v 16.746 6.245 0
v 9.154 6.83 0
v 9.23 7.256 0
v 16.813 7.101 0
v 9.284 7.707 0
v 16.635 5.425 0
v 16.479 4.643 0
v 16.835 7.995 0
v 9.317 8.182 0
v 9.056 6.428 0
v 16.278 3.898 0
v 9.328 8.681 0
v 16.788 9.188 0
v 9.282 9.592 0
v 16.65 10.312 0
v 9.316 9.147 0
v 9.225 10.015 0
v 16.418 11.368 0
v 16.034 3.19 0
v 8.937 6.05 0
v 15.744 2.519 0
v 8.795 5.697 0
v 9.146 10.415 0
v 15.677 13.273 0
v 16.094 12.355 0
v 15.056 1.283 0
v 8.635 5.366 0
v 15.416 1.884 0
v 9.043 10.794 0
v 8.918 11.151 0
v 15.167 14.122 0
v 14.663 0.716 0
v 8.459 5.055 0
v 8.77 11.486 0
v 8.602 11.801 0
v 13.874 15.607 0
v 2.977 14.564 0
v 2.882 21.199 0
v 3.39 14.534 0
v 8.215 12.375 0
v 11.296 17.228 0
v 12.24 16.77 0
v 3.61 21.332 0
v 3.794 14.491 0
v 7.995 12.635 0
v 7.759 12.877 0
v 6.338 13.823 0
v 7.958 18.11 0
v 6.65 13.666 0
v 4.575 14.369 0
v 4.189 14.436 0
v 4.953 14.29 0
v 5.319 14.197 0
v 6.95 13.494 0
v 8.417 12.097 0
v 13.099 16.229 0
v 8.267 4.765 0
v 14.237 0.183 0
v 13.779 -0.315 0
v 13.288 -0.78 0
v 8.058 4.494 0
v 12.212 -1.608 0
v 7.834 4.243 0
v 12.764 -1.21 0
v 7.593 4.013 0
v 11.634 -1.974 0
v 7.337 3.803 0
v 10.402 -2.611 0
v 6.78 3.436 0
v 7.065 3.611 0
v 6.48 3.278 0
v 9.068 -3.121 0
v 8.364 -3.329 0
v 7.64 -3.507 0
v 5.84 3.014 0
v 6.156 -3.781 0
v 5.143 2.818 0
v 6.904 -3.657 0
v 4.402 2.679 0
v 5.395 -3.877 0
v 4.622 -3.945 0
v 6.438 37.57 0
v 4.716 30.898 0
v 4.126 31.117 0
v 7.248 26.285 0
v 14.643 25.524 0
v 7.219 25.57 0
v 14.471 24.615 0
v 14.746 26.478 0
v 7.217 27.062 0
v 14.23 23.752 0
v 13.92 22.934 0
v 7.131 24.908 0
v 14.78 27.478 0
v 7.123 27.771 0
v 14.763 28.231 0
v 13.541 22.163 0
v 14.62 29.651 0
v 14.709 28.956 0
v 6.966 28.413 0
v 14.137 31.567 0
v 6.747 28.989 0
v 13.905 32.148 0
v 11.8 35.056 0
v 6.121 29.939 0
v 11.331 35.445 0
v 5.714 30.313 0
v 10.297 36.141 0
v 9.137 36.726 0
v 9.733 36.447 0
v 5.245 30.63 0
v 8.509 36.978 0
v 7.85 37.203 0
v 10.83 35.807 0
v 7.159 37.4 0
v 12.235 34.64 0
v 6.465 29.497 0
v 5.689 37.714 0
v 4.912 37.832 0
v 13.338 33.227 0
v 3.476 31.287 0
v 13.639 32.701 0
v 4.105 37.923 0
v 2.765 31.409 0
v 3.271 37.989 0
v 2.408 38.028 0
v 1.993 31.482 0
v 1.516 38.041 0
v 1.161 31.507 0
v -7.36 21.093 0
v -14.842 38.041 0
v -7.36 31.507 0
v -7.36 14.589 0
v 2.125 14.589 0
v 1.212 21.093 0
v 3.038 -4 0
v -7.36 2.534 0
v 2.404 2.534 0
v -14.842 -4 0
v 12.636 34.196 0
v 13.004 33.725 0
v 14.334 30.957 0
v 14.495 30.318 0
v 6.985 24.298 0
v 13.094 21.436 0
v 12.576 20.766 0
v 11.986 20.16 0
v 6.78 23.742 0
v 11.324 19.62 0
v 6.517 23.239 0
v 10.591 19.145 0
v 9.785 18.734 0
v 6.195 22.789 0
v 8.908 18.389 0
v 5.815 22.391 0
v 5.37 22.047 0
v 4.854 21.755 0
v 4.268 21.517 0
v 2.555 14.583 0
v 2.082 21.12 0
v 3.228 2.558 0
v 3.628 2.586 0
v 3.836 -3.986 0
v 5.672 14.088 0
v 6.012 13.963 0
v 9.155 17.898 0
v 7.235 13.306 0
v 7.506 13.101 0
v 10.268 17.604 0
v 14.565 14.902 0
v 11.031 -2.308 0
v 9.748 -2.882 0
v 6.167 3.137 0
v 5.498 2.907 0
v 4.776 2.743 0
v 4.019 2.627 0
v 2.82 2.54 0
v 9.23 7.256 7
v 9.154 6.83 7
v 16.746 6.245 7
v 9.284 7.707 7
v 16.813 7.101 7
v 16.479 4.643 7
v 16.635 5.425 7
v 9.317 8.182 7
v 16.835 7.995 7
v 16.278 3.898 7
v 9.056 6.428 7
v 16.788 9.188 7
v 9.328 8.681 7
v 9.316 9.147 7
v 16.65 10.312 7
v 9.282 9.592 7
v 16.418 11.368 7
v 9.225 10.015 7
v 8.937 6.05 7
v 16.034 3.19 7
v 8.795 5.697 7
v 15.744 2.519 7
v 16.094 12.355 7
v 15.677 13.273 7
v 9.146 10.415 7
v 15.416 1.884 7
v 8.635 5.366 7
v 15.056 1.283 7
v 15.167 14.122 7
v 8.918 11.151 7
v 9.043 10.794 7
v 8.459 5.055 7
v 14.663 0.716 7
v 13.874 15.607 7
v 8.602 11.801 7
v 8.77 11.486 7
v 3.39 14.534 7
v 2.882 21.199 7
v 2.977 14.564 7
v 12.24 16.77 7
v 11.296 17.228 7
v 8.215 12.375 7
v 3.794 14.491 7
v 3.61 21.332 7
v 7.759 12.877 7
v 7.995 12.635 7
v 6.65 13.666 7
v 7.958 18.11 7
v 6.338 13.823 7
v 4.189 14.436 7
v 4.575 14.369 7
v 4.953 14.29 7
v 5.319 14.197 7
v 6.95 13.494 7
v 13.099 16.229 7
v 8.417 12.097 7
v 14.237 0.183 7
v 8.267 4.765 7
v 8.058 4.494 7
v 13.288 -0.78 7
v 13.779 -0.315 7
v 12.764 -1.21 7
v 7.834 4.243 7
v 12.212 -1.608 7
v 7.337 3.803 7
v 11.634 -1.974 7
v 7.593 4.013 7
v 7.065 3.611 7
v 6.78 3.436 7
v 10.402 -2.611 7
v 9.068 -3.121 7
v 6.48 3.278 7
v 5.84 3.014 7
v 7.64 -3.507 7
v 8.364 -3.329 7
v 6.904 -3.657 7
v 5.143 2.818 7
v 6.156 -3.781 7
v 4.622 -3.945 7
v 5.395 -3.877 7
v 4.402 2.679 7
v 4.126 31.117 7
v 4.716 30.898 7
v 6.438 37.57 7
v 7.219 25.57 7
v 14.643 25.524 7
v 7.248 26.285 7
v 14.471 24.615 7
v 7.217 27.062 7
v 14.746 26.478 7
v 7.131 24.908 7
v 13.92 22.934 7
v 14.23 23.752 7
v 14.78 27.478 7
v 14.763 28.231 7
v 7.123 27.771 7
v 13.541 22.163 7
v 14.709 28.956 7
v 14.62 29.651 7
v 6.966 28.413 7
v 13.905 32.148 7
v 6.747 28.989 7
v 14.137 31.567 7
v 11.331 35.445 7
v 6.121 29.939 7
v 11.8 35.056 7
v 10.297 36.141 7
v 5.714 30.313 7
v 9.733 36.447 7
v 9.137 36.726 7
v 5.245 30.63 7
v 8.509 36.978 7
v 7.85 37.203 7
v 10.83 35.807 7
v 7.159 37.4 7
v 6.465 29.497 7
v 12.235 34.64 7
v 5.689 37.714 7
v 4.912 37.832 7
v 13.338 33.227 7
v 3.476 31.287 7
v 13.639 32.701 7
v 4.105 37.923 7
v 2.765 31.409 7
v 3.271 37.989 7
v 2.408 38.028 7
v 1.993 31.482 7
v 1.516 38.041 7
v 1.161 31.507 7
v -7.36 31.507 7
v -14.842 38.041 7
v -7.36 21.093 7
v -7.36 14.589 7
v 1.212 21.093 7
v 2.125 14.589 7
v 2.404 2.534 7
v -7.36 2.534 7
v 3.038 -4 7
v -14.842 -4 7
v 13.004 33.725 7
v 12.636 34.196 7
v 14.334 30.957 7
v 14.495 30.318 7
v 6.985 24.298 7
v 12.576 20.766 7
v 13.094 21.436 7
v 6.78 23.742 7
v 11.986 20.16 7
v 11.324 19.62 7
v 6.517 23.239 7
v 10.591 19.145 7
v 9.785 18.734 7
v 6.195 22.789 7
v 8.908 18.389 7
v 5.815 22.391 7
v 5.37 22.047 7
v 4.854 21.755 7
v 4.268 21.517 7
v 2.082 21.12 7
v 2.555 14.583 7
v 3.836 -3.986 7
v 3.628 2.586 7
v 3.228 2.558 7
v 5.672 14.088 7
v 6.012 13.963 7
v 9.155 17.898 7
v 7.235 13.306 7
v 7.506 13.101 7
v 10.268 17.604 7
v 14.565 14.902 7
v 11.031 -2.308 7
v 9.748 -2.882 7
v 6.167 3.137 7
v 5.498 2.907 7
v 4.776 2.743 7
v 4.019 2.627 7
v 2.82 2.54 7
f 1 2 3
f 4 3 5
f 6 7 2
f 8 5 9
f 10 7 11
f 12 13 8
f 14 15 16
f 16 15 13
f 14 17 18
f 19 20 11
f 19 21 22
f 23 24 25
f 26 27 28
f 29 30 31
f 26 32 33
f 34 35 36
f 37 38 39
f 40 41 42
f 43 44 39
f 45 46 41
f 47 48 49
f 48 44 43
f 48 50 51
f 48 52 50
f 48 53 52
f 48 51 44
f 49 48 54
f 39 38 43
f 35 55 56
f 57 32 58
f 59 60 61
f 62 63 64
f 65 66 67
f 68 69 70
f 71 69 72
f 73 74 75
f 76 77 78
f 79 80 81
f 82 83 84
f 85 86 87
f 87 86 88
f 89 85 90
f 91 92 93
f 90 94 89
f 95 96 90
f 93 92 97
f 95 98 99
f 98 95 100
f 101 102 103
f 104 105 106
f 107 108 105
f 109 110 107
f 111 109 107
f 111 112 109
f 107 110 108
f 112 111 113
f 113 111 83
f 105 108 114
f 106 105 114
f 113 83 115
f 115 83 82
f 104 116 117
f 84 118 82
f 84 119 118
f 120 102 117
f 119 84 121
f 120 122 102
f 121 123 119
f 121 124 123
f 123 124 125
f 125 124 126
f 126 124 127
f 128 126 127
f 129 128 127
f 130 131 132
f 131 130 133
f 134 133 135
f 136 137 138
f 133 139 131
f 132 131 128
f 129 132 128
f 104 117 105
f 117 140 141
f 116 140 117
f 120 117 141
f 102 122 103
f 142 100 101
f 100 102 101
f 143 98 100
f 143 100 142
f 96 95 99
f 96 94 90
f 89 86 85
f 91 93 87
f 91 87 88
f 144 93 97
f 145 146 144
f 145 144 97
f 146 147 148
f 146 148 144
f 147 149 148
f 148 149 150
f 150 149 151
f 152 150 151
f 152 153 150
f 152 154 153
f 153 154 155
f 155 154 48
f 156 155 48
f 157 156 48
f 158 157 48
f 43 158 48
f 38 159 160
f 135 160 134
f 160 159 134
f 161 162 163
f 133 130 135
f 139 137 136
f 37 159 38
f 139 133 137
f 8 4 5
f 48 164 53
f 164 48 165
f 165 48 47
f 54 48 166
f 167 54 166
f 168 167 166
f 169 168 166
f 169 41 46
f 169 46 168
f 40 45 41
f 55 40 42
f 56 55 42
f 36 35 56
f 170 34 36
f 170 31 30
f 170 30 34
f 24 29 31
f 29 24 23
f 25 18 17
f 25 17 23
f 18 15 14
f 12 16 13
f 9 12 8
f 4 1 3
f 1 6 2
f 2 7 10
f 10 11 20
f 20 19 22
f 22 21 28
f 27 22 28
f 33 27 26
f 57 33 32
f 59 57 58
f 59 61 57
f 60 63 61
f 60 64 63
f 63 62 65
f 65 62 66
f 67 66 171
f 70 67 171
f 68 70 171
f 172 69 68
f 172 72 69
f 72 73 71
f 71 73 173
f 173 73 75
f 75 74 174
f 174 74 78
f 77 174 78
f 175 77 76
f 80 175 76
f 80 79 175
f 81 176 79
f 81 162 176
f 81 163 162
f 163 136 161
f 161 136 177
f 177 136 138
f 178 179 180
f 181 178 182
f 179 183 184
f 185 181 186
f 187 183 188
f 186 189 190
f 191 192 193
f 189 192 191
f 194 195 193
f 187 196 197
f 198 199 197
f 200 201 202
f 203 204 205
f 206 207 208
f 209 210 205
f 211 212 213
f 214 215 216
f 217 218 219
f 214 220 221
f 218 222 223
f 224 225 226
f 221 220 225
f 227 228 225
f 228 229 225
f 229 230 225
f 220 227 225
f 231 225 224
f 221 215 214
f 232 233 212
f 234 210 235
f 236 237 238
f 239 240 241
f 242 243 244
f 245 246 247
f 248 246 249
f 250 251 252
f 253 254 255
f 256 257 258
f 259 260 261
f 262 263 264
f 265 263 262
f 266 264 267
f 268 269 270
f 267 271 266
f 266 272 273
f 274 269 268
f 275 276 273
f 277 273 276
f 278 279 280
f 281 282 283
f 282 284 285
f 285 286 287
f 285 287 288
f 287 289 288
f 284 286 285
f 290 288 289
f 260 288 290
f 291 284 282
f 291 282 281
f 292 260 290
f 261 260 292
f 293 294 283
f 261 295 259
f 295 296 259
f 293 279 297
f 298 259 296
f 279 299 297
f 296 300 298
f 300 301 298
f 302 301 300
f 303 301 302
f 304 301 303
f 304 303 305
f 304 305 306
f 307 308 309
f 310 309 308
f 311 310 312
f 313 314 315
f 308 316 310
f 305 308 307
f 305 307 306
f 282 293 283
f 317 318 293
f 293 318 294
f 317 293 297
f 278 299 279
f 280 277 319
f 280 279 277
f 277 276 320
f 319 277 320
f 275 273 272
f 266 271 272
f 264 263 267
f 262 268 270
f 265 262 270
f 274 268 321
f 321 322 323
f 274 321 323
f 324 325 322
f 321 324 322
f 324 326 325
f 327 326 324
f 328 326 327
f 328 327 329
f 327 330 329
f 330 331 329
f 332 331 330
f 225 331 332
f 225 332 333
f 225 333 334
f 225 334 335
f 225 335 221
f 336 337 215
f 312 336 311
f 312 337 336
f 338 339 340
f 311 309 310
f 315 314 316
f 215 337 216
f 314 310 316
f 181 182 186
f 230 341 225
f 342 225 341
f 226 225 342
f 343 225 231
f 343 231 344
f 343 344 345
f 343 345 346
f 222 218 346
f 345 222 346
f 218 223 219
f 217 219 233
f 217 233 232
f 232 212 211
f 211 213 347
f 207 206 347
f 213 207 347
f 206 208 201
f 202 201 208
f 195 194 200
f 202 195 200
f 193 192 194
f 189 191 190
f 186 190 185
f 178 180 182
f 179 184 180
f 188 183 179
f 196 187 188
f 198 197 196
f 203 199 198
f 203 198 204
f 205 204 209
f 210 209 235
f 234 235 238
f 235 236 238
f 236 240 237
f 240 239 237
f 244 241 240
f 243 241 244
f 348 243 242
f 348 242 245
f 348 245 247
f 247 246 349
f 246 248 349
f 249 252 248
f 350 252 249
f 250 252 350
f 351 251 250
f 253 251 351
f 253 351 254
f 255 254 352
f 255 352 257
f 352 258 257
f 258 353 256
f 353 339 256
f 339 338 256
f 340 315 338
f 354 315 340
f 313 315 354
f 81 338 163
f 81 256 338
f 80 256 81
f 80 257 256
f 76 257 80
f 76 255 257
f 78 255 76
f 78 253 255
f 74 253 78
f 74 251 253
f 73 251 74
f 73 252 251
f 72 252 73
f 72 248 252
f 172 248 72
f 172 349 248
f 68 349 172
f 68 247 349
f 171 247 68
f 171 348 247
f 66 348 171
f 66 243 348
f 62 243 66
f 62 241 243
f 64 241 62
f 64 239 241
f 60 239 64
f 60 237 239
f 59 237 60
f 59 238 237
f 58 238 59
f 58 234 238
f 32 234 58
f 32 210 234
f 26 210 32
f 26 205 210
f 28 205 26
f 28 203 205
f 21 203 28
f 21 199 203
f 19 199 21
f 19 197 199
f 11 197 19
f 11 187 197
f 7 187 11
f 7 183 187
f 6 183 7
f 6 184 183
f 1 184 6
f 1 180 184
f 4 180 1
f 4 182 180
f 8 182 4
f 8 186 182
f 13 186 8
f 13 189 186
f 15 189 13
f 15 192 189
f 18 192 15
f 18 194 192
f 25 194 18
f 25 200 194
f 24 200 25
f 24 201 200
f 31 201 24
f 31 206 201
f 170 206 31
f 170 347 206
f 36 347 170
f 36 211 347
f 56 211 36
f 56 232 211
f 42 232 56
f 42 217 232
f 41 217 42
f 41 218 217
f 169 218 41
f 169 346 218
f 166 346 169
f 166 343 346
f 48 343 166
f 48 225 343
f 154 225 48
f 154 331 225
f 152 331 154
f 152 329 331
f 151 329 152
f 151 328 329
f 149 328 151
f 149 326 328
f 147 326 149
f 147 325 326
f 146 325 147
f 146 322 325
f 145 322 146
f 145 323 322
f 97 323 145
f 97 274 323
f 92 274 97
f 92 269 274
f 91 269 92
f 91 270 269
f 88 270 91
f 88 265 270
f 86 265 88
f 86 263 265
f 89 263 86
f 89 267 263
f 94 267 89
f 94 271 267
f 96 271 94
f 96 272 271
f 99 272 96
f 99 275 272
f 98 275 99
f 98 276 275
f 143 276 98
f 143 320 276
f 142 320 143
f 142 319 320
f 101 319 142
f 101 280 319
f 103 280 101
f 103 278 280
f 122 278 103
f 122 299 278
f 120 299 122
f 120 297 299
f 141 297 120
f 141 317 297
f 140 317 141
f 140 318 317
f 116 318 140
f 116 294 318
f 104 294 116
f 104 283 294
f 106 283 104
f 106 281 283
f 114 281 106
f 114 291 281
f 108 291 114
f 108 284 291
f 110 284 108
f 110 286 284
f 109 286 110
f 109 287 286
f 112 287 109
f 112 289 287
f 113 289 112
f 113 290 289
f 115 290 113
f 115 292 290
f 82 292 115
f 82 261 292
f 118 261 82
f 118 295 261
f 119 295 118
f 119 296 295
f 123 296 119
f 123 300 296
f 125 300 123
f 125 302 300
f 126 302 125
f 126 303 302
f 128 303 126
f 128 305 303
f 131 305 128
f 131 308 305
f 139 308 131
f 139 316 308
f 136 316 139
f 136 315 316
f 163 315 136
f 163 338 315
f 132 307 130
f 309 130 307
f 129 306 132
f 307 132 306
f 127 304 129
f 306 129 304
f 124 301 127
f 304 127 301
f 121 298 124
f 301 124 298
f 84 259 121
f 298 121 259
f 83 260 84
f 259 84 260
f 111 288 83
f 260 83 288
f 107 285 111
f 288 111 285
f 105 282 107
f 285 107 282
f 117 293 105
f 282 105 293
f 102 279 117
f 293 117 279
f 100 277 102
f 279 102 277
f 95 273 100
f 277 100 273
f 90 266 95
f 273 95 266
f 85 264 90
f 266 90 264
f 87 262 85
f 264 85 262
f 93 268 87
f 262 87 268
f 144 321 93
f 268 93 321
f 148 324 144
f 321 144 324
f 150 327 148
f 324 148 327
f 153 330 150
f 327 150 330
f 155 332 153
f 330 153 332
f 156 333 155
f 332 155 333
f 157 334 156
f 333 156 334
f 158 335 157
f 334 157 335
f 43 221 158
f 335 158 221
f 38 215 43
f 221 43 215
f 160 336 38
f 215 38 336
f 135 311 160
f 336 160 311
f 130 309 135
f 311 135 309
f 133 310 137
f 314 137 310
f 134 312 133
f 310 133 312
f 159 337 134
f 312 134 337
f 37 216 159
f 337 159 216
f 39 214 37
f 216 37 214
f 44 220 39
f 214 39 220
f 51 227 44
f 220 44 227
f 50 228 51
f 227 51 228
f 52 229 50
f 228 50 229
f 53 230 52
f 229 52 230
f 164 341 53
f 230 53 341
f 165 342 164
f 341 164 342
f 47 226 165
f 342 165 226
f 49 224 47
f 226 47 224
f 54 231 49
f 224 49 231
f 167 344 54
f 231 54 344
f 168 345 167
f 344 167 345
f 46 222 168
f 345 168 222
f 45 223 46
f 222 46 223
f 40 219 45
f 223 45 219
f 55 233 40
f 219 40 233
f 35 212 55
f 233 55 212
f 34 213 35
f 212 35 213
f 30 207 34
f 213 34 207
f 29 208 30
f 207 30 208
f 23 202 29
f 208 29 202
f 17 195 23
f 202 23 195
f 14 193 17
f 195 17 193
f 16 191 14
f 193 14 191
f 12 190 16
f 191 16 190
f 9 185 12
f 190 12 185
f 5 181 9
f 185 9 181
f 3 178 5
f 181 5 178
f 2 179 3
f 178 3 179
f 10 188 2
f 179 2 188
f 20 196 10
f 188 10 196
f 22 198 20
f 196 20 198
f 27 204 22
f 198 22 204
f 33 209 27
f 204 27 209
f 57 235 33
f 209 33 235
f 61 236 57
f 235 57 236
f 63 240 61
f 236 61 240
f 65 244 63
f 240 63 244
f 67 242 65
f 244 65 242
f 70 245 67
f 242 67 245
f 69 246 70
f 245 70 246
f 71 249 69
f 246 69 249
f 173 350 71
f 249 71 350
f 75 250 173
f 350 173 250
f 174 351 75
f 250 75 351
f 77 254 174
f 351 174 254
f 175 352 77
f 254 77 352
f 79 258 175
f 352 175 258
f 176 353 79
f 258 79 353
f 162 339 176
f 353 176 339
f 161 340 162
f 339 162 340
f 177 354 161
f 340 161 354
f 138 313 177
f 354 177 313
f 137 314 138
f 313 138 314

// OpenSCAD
// file: glyph.scad
// glyph — the shared geometry of every letter in the set. Defines named geometry
// only, so it renders nothing on its own; each letter part includes it and calls
// letter(). Every dimension lives in ../../lib/common.scad.
//
// A LETTER IS NOTHING BUT A LETTER. No plinth, no tongue, no tab — it is the
// bare glyph, and it attaches by standing in the deck groove and resting on the
// groove's floor. Anything else on it would be a distraction on a learning toy.
//
// It is a flat plate of one thickness, printed face-down: no overhang anywhere,
// no supports, and the face on the bed comes out smoothest.
//
// TWO TRAPS WITH text():
//
//  * A missing font FALLS BACK SILENTLY — no warning, no error, just different
//    letters. "Liberation Sans" was the first choice here because OpenSCAD
//    bundles it; on macOS the bundled faces are not registered with fontconfig,
//    so it rendered the fallback face instead and nothing said so. To check a
//    font resolved, render a string with it and with a deliberately bogus name
//    and compare bounding boxes: identical means it fell back.
//  * `size` is not the cap height in general. For Helvetica Bold they coincide
//    (size 44 -> 44.0 mm cap), which is why letter_size reads as a height.
//    Change the font and re-measure.

include <../../lib/common.scad>

// The letter's outline, upright in the XY plane, ready to be extruded along Z
// (which is the letter's thickness, and the print's build axis).
//
//   y = 0   is the deck surface
//   y < 0   is the part standing down inside the groove. It reaches letter_bury,
//           which is where the tapered groove closes to letter_t — NOT the
//           groove's floor. The letter wedges; it never bottoms out.
module glyph_2d(ch) {
    intersection() {
        translate([0, -letter_bury])
            scale([letter_condense, 1])
                text(ch, size = letter_size, font = letter_font,
                     halign = "center", valign = "baseline");
        // Trimmed flat at the baseline. Round letters (O, C, G, S) overshoot the
        // baseline by design, and a letter standing on a convex curve rocks —
        // there is nothing to stop it leaning. The trim costs nothing visible
        // and gives every letter a flat foot on the groove floor.
        translate([-200, -letter_bury]) square([400, 400]);
    }
}

// One letter, in its print orientation: lying on its face, thickness up Z.
module letter(ch) {
    linear_extrude(letter_t) glyph_2d(ch);
}

// Where that letter sits once it is dropped into a chassis, for fit checks.
module letter_fitted(ch) {
    translate([0, letter_t/2, body_top]) rotate([90, 0, 0]) letter(ch);
}
// main file
// letter B — one part. See glyph.scad for the geometry and lib/common.scad for
// the dimensions. Prints lying on its face, exactly as exported: no supports.

include <glyph.scad>

letter("B");
